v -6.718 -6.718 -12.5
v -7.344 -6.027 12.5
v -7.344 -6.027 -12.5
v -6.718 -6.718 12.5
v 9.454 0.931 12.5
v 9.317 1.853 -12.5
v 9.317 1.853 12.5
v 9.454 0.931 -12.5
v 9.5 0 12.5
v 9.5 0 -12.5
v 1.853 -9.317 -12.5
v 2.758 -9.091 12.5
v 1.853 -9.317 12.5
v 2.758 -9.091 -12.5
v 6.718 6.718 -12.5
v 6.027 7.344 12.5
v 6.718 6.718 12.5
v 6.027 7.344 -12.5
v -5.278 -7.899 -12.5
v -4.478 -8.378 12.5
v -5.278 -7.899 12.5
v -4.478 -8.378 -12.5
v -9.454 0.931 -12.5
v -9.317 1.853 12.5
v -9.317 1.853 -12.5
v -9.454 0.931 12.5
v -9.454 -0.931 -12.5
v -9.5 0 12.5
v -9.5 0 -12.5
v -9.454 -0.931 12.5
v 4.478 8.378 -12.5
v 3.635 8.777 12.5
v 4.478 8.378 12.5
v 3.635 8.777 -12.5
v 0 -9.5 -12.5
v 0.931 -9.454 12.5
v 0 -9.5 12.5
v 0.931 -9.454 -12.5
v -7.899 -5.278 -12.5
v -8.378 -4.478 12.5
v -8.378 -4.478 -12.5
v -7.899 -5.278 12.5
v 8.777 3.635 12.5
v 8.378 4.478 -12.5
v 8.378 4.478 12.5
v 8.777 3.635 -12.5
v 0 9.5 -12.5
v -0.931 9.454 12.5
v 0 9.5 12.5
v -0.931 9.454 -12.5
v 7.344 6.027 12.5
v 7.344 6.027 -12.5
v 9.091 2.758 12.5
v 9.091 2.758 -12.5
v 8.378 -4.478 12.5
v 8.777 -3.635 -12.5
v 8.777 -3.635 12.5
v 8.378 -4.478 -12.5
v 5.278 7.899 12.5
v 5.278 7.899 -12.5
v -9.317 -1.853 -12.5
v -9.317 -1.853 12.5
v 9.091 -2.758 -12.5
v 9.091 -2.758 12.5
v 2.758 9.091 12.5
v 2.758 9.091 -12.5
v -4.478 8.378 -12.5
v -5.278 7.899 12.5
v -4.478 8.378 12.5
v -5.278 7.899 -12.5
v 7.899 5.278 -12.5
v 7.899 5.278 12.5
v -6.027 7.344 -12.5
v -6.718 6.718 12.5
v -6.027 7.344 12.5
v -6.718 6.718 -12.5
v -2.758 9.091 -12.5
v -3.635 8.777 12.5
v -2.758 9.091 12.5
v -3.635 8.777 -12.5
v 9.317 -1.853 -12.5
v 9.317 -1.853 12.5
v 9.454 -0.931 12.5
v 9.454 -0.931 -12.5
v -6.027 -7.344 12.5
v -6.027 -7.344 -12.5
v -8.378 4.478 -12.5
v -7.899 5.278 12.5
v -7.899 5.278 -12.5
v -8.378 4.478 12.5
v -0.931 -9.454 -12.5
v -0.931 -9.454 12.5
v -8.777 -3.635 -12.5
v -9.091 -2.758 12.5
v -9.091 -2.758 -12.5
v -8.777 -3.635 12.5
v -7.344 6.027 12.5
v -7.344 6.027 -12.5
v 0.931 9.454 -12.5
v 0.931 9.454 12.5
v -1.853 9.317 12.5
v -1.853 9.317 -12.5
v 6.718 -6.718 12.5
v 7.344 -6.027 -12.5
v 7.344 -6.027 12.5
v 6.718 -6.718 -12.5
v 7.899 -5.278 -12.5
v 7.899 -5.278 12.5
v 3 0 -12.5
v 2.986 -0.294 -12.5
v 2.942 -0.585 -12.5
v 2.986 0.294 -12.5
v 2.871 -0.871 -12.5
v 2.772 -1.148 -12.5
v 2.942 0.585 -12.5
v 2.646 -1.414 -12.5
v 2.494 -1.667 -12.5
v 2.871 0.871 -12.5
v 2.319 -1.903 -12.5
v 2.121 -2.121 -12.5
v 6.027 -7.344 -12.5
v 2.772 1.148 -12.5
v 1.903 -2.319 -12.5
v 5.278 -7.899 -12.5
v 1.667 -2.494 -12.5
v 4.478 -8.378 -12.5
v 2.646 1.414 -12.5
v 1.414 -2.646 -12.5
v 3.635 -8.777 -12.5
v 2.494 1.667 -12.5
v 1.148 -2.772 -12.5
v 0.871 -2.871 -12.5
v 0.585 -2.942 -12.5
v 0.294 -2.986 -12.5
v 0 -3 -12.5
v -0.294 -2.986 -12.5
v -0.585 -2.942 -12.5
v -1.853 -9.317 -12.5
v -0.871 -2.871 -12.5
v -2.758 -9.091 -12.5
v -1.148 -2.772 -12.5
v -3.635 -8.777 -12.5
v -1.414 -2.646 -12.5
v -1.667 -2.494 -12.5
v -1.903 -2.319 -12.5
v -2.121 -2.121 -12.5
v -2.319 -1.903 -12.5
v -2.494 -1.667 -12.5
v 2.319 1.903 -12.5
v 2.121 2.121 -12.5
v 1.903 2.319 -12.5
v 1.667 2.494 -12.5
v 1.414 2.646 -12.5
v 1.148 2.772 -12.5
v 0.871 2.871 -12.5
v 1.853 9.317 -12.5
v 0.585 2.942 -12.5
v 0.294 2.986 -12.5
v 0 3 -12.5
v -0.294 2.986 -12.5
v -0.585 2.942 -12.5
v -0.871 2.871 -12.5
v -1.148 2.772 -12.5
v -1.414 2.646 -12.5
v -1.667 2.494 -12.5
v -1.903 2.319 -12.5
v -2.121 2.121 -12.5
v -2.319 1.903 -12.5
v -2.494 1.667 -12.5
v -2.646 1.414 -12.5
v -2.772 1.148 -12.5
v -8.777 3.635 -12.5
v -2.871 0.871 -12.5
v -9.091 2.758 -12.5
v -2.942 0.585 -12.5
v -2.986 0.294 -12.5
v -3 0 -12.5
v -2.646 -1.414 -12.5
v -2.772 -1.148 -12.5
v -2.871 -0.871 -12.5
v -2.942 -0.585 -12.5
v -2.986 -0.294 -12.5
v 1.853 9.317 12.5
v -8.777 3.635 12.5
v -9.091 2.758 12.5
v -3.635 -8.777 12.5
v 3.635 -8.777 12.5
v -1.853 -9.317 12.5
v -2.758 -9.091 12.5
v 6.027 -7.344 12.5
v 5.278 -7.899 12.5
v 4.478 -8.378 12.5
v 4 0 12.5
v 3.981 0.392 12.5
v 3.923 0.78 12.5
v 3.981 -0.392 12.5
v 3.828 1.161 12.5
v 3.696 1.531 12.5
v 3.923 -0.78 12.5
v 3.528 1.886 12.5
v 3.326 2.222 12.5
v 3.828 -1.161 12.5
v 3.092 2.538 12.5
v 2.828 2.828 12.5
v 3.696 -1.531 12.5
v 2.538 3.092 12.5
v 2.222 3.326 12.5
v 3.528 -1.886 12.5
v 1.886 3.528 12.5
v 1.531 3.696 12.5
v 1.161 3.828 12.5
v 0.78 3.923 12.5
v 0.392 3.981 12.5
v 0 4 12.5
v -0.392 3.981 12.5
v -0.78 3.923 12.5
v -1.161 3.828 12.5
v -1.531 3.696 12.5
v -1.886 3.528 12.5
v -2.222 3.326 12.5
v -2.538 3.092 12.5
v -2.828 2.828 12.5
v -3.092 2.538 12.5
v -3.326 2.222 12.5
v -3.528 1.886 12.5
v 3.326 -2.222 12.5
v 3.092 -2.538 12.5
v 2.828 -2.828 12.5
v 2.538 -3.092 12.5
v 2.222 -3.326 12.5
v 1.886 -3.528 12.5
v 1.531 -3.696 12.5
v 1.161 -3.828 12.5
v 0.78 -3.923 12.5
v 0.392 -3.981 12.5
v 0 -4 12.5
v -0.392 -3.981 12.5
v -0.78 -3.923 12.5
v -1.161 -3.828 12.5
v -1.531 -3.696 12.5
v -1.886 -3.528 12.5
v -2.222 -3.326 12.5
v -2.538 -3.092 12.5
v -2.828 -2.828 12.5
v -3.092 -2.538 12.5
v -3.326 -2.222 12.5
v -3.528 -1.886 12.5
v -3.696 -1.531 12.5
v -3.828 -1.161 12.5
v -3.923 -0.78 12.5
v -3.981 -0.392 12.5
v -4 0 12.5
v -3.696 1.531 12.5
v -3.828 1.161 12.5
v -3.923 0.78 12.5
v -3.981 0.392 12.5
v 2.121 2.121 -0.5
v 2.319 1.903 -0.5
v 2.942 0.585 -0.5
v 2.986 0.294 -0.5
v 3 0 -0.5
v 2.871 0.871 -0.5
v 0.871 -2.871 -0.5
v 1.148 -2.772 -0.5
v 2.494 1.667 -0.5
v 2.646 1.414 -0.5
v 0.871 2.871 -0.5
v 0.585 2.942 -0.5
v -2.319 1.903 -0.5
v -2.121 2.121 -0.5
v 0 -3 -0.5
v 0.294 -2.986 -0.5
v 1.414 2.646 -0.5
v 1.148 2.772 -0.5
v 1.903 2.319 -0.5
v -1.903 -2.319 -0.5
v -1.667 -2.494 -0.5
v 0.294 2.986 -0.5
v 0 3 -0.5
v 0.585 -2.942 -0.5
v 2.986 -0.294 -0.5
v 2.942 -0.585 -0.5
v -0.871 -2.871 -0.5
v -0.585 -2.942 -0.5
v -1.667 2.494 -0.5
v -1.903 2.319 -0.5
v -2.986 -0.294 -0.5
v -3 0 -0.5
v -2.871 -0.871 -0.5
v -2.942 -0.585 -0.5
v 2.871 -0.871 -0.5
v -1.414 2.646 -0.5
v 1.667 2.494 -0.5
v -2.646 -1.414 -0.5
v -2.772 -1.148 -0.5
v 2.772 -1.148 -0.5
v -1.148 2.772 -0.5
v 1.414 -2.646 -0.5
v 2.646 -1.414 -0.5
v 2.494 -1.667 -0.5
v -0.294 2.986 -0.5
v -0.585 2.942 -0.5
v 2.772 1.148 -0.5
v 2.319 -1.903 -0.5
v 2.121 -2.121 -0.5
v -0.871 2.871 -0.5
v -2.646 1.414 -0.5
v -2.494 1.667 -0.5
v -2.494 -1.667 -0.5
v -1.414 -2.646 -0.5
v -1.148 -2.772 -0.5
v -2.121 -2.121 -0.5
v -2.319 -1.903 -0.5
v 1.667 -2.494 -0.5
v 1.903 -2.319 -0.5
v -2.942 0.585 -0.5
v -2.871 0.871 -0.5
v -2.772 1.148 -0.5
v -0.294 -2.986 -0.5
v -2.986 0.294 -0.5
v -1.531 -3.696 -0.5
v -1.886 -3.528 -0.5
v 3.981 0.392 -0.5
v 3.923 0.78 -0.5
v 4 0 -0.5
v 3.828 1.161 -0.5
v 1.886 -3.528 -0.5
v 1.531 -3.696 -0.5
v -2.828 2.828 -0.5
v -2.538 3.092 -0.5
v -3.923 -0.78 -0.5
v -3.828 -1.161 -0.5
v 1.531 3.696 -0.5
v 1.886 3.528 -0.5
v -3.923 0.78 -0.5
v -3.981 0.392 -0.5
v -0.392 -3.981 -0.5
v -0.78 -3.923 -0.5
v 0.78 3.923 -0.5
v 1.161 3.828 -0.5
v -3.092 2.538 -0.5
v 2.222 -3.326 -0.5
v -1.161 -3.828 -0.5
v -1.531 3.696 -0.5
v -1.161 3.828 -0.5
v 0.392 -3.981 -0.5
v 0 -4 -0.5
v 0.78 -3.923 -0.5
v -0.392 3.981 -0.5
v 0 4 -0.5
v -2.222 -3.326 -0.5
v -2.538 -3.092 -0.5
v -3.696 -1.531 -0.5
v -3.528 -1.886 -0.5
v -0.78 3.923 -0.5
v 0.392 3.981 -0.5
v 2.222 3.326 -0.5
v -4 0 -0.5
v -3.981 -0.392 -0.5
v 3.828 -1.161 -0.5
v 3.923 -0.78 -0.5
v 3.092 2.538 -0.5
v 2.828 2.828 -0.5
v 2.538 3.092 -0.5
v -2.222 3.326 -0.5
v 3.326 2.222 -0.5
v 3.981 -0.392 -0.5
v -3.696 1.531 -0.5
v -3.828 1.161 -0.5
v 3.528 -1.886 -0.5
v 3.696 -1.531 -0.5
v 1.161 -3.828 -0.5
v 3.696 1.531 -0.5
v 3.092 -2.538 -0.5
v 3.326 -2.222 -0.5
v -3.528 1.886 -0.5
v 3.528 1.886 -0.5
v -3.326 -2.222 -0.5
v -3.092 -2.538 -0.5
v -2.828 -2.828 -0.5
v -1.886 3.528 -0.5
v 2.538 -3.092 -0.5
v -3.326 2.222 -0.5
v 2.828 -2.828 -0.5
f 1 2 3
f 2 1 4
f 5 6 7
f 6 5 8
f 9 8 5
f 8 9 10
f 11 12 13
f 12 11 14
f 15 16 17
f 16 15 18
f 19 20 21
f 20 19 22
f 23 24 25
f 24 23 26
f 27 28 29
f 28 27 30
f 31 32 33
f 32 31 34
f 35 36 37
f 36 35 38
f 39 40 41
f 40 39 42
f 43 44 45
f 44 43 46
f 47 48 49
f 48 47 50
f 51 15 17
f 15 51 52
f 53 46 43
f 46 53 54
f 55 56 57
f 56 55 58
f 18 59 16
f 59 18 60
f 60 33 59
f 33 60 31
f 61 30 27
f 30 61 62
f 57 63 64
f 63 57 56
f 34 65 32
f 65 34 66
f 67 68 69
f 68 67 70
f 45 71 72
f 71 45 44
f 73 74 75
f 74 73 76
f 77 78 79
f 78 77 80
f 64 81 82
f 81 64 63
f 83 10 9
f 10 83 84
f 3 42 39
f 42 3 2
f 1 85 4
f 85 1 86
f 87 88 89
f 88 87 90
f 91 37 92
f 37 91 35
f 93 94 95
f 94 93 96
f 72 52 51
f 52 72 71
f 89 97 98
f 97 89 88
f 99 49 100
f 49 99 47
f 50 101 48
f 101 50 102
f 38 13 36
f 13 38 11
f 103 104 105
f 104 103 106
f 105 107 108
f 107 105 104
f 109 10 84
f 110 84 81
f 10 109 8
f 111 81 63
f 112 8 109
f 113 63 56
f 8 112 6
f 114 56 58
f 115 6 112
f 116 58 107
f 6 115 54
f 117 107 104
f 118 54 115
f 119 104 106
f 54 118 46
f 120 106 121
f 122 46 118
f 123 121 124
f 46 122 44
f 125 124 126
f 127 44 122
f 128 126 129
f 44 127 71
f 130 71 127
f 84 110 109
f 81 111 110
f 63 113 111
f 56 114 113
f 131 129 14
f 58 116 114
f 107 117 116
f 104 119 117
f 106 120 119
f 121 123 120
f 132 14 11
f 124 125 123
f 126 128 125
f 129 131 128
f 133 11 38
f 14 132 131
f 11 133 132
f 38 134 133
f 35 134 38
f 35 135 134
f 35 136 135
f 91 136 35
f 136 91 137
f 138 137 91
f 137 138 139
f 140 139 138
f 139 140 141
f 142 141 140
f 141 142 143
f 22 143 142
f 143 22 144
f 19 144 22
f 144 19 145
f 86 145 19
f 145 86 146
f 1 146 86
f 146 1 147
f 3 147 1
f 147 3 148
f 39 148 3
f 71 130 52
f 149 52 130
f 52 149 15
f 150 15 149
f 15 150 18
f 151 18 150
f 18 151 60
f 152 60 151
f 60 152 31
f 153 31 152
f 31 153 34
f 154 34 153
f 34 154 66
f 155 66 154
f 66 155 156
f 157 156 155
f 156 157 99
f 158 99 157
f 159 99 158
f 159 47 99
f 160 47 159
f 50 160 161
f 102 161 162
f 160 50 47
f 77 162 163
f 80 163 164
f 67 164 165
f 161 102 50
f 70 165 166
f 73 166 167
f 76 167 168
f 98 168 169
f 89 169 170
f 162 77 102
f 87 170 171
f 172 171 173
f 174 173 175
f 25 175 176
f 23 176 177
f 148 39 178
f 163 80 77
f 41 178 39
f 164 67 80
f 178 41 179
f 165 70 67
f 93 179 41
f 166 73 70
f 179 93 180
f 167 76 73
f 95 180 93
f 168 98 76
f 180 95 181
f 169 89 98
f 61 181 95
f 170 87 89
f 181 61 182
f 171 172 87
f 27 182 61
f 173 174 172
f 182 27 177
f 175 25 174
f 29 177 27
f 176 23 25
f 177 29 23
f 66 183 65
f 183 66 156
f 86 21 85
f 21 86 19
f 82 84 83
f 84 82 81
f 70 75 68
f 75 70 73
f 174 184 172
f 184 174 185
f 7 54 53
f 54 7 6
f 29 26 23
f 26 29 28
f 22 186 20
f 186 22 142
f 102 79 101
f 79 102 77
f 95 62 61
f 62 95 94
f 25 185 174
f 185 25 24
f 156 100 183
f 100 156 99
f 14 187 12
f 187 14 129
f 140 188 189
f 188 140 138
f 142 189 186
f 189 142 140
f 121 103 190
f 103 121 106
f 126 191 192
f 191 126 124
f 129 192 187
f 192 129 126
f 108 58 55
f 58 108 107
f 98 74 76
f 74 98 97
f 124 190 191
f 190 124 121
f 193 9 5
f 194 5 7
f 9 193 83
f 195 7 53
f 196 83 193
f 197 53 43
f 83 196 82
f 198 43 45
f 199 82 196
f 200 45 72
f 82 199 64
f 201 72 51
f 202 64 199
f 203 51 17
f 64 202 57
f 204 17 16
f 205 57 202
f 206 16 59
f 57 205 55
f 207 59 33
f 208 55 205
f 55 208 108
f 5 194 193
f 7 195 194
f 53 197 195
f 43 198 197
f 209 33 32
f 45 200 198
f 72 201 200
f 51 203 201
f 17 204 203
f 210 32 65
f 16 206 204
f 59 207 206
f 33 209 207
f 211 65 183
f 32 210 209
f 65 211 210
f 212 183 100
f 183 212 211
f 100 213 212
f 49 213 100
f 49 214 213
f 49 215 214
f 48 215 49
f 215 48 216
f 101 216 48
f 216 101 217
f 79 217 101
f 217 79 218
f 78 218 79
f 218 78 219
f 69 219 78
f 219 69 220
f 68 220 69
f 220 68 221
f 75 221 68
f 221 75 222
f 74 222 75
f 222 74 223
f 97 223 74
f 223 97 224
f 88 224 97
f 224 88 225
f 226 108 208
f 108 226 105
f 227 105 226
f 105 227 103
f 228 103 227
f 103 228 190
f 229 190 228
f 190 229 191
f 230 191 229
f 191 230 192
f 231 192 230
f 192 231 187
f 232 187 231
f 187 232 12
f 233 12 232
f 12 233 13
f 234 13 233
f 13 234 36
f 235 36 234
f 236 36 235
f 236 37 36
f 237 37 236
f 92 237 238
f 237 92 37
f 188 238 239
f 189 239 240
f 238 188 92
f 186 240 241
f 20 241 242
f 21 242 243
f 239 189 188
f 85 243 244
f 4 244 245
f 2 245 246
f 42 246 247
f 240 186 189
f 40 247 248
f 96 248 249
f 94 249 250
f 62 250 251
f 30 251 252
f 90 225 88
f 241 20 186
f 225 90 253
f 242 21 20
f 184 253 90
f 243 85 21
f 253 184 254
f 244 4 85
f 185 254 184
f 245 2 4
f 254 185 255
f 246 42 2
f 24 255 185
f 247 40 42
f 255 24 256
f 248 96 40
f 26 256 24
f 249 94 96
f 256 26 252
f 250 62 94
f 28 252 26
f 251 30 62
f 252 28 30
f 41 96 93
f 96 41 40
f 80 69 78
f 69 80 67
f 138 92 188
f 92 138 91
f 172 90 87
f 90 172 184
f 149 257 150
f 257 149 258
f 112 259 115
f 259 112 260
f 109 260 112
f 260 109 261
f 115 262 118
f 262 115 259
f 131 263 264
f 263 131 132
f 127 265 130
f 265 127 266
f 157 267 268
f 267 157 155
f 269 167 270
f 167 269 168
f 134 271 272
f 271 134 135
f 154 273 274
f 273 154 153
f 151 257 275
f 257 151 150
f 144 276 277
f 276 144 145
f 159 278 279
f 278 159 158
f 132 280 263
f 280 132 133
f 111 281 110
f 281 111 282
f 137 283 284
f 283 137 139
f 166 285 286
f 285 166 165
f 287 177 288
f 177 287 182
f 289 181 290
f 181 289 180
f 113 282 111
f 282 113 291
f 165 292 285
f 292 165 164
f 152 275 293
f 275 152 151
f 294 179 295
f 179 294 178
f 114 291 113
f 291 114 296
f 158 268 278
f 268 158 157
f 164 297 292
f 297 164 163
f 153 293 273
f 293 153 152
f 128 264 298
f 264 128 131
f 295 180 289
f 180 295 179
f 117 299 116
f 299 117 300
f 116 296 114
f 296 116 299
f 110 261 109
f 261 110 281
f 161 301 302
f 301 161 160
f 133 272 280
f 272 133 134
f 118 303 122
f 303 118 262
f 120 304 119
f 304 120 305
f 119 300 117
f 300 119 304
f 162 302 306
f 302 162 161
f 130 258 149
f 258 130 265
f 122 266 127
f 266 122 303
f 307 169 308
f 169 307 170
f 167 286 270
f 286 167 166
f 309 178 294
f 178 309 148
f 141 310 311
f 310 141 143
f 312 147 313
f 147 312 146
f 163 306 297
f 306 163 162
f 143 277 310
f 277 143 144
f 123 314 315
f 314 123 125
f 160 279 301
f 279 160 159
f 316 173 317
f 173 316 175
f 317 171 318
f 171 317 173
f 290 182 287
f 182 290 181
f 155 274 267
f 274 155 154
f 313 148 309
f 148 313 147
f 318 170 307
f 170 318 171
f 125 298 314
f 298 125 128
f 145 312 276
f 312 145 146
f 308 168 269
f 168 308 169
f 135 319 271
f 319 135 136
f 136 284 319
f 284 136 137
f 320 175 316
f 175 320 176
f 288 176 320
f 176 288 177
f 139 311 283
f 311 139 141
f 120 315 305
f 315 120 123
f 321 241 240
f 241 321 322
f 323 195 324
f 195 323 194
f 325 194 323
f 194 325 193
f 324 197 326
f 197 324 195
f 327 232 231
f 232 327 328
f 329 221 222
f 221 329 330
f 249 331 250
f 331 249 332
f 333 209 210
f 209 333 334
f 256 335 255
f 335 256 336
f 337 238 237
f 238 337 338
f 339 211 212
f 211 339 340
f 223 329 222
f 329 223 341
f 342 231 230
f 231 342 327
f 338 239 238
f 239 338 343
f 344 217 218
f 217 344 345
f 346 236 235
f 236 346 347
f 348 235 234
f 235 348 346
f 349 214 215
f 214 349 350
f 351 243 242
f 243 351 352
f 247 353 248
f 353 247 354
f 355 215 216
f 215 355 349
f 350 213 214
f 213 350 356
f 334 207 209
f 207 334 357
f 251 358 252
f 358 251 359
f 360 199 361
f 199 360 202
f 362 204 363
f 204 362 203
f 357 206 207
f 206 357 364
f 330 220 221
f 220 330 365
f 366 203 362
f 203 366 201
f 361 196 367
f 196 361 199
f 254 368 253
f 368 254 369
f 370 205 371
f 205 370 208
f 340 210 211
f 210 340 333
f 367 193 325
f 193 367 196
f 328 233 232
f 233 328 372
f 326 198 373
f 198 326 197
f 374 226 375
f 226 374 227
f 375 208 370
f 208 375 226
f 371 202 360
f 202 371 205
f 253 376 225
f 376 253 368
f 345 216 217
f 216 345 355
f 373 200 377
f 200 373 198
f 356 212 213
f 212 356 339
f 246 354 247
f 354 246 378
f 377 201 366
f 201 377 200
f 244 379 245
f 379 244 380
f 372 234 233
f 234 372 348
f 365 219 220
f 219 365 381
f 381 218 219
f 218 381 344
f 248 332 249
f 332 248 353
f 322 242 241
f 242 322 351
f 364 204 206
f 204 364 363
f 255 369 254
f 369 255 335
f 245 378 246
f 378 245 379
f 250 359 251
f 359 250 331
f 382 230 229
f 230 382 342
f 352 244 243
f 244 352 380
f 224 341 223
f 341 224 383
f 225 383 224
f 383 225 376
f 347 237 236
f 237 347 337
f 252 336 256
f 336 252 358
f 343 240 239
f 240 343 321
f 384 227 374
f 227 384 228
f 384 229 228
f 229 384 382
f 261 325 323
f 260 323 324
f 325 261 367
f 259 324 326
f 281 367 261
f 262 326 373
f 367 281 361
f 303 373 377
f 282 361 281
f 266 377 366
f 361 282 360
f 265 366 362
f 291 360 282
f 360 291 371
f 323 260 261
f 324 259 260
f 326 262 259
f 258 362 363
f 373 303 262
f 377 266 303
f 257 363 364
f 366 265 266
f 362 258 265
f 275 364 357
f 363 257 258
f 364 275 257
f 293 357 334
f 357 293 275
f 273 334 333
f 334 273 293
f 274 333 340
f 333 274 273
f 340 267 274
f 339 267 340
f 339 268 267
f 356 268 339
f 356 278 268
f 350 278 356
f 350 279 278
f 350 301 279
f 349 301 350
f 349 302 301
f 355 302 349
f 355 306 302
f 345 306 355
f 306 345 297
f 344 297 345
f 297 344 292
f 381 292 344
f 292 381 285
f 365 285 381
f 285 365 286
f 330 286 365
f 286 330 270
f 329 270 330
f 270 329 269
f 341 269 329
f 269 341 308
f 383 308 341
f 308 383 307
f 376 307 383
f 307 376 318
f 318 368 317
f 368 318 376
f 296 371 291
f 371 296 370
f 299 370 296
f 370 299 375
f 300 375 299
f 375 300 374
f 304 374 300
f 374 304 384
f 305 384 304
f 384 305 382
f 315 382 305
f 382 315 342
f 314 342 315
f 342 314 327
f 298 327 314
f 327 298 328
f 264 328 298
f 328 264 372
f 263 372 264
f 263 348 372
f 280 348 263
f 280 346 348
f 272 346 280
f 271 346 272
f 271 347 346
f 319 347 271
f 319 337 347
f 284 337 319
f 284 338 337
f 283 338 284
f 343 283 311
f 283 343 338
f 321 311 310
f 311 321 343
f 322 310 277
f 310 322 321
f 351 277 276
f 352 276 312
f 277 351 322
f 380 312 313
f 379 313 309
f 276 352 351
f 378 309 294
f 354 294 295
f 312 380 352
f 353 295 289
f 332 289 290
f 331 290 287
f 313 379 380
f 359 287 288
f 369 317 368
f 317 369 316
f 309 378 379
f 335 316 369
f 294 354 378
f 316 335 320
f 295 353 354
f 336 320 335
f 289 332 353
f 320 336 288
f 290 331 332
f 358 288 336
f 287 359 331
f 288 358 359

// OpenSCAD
// Parameters
outer_diameter_mm = 19; //[10:38:0.5]
length_mm = 25; //[12.5:50:0.5]
bore1_diameter_mm = 6; //[3:12:0.1]
bore2_diameter_mm = 8; //[4:16:0.1]
flexible = 1; //[0:1:1]
grub_screw_count = 4; //[2:8:1]
grub_screw_axial_offset_mm = 5; //[2.5:10:0.5]
grub_screw_hole_diameter_mm = 3; //[2:5:0.1]
grub_screw_hole_depth_mm = 6; //[4:12:0.5]
overlap_mm = 1; //[0.5:2:0.1]
helix_turns = 5; //[2:10:1]
helix_cut_width_mm = 1.2; //[0.6:2.5:0.1]
helix_cut_radial_depth_mm = 4; //[2:7:0.5]

// Helical Flexure
module flex() {
  color("Silver") {
    difference() {
      // Outer cylinder
      cylinder(r=outer_diameter_mm/2, h=length_mm, center=true, $fn=64);
      
      // Bore 1
      translate([0, 0, -length_mm/4])
        cylinder(r=bore1_diameter_mm/2, h=length_mm/2 + overlap_mm, center=true, $fn=64);
      
      // Bore 2
      translate([0, 0, length_mm/4])
        cylinder(r=bore2_diameter_mm/2, h=length_mm/2 + overlap_mm, center=true, $fn=64);
      
      // Helical cut
      rotate_extrude(angle=-helix_turns*360, $fn=helix_turns*16)
        translate([bore1_diameter_mm/2, 0, 0])
          square([helix_cut_radial_depth_mm, helix_cut_width_mm], center=true);
    }
  }
}

// Shaft Coupling
module shaft_coupling() {
  color("Silver") {
    difference() {
      // Outer cylinder
      cylinder(r=outer_diameter_mm/2, h=length_mm, center=true, $fn=64);
      
      // Bore 1
      translate([0, 0, -length_mm/4])
        cylinder(r=bore1_diameter_mm/2, h=length_mm/2 + overlap_mm, center=true, $fn=64);
      
      // Bore 2
      translate([0, 0, length_mm/4])
        cylinder(r=bore2_diameter_mm/2, h=length_mm/2 + overlap_mm, center=true, $fn=64);
      
      // Grub screw holes
      for (i = [0:1]) {
        for (j = [0:1]) {
          rotate([0, 0, j*90])
            translate([0, 0, (i*2-1)*(length_mm/2 - grub_screw_axial_offset_mm)])
              rotate([0, 90, 0])
                cylinder(r=grub_screw_hole_diameter_mm/2, h=outer_diameter_mm + 2*overlap_mm, center=true, $fn=32);
        }
      }
    }
  }
}

// Assembly
module assembly() {
  flex();
  translate([0, 0, 0]) shaft_coupling();
}

assembly();
